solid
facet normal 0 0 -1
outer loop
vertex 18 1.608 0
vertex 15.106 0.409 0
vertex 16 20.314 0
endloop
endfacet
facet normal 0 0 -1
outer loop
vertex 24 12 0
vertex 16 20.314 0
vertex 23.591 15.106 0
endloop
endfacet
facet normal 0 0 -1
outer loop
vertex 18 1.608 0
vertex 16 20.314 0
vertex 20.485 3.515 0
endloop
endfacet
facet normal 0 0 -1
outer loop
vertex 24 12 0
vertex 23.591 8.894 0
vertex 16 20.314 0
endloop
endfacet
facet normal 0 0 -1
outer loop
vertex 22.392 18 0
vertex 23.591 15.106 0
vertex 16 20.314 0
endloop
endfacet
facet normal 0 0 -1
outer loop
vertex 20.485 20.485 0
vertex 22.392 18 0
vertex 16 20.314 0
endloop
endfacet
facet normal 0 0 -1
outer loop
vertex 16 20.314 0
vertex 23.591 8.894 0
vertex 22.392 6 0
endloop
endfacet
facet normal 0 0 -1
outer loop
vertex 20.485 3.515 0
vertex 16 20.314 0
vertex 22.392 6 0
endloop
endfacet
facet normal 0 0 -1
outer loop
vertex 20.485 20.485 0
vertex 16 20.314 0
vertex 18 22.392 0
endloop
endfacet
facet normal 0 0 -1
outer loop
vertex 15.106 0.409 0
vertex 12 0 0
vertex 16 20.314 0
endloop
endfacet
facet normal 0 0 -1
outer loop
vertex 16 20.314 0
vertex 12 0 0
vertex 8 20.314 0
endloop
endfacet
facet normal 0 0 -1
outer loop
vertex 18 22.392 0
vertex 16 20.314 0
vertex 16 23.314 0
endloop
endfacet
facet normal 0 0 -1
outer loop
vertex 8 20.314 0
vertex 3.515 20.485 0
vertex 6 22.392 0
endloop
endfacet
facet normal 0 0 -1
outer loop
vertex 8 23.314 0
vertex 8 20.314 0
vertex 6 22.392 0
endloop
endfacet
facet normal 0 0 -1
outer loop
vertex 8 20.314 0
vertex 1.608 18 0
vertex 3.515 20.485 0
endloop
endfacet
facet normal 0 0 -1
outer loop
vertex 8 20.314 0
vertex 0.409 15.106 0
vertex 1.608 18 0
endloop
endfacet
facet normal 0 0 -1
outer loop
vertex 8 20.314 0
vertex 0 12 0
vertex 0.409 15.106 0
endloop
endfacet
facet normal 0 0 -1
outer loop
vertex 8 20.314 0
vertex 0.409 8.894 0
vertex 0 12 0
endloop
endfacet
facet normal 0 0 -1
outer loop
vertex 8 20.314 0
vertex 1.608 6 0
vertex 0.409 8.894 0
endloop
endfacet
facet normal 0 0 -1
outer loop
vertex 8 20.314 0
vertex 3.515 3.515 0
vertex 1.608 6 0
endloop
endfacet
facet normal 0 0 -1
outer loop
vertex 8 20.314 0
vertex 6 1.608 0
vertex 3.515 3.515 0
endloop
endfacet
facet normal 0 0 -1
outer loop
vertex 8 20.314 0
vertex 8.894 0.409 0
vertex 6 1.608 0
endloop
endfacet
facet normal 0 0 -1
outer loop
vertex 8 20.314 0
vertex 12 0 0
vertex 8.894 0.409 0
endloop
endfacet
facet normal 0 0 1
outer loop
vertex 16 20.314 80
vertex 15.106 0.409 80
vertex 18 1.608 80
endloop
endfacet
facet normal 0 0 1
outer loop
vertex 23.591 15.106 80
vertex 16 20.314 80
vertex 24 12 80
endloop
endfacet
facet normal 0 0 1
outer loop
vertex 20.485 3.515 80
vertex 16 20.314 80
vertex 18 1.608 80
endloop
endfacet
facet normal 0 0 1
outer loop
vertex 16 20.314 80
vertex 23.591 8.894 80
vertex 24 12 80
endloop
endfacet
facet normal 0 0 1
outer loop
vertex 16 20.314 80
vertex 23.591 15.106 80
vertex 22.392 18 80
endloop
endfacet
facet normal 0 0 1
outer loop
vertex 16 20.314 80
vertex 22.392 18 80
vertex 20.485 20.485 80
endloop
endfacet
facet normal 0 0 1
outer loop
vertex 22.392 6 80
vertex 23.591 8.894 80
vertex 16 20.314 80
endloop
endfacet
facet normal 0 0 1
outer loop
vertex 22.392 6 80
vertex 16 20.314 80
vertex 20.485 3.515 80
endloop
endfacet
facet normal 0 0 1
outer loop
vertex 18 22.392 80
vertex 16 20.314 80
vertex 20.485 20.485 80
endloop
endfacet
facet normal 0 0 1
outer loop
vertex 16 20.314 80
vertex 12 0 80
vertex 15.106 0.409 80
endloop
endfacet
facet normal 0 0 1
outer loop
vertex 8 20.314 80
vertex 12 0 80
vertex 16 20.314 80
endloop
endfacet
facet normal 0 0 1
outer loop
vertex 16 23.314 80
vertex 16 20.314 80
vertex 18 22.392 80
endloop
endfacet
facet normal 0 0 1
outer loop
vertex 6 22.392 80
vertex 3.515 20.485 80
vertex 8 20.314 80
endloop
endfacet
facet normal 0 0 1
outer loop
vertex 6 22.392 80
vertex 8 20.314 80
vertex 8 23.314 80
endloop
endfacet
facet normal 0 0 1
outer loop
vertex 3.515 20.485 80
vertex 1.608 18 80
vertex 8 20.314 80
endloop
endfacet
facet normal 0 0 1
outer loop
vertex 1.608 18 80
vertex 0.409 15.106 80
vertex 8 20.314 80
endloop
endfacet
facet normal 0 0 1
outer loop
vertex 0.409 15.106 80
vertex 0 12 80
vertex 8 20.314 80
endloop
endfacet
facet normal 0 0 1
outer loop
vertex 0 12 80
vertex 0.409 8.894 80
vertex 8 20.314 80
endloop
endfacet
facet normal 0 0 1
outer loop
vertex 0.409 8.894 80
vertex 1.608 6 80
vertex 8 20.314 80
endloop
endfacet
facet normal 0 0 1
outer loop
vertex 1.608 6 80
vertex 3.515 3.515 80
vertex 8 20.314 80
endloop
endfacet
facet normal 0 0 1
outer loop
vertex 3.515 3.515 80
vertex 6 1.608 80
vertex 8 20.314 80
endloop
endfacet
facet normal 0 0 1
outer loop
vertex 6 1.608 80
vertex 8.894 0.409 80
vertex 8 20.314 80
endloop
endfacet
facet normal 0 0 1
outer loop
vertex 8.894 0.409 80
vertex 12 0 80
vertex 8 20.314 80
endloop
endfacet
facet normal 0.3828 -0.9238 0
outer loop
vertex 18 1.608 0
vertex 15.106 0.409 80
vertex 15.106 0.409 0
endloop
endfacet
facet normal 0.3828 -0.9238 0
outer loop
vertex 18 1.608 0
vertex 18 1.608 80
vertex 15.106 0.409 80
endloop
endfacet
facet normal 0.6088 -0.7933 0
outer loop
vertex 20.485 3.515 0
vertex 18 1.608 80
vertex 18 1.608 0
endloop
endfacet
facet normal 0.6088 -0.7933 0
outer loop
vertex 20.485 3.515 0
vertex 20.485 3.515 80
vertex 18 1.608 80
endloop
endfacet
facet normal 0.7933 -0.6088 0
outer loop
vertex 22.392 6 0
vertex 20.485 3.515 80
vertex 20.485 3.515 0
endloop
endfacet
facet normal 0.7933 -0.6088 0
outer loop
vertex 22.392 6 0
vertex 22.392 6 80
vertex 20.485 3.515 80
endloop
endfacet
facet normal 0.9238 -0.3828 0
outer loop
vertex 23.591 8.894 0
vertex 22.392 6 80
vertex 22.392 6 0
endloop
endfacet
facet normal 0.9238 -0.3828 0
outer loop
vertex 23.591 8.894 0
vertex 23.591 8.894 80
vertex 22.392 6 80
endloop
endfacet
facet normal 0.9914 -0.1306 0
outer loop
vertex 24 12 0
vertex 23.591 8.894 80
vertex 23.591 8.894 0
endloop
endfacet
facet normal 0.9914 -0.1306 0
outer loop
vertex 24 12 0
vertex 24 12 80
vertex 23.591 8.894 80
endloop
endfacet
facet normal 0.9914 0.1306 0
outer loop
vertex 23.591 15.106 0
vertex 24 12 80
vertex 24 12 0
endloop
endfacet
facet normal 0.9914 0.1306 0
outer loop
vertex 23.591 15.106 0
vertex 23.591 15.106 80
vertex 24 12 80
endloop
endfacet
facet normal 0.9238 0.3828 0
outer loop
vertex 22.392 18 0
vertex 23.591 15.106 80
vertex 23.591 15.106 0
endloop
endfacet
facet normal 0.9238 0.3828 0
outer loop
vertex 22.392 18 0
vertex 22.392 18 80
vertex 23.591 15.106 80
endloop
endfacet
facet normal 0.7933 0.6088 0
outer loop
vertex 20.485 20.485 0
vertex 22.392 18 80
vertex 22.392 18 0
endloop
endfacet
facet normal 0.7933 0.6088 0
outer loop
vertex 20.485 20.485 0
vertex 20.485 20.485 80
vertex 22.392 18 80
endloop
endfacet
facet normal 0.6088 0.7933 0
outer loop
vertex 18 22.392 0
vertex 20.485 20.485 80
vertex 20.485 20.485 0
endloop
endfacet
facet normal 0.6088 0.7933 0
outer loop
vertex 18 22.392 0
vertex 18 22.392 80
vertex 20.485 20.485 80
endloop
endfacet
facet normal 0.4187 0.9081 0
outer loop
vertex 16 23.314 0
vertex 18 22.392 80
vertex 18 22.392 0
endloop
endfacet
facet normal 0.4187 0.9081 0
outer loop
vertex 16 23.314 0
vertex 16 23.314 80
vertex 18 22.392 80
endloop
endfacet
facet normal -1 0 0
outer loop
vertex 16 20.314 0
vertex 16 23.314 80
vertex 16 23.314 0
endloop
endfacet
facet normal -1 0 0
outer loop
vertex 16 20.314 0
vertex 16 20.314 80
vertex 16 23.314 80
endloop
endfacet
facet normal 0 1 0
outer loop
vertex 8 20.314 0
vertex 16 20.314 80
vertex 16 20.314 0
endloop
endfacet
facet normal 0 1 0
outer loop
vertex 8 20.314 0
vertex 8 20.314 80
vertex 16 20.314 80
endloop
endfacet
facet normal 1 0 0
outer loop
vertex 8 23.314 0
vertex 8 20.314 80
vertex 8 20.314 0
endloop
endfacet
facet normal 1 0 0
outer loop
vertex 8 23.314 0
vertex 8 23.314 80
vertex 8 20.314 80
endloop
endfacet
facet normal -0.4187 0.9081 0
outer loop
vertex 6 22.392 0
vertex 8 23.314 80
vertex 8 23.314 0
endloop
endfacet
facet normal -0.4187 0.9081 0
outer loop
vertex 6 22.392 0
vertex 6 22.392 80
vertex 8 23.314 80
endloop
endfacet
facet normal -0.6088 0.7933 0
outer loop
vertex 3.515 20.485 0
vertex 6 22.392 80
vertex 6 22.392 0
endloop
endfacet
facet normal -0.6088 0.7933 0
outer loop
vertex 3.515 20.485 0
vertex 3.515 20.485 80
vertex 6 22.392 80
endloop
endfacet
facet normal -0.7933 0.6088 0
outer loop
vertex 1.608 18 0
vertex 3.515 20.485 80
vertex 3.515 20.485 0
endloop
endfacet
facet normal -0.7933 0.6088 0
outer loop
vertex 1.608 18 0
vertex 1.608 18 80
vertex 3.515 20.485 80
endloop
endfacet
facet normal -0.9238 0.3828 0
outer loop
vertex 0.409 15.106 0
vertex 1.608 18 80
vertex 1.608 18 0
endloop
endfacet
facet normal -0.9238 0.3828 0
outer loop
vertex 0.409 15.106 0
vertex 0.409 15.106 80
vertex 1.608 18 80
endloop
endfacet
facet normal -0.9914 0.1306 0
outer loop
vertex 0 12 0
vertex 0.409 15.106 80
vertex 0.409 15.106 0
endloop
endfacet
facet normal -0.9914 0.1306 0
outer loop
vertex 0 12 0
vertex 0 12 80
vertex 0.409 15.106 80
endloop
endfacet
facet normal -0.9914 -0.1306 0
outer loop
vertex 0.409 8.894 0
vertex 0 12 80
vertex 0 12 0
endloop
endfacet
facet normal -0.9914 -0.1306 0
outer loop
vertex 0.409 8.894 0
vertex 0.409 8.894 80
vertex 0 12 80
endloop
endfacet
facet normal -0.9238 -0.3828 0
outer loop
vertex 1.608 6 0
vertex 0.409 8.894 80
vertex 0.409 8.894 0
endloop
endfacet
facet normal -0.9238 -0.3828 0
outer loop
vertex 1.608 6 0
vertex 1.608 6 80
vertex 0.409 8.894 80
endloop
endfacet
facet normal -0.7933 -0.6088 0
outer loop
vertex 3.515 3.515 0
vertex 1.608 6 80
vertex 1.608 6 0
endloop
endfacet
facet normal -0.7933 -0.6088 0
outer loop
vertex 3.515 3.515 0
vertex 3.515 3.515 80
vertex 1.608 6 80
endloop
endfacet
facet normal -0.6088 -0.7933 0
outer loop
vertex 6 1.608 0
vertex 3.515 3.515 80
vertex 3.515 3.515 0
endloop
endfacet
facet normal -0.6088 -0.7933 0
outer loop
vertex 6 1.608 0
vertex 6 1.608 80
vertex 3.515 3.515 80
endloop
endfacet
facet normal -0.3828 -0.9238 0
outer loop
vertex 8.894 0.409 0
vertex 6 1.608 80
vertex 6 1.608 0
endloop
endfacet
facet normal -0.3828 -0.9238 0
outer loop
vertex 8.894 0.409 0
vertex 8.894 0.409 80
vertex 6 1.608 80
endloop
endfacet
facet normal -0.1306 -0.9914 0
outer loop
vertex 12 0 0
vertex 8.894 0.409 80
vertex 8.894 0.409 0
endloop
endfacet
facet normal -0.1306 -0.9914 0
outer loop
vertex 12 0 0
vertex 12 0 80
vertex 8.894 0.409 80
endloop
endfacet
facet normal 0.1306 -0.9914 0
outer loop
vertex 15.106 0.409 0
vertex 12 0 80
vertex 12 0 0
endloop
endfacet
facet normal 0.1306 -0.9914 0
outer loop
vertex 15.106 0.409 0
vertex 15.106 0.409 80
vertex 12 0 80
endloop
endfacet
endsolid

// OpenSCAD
$fn = 32;

// ----------------------------------------------------------------------
// Keyway shaft: d24 shaft, key 8 x 3 mm
// ----------------------------------------------------------------------

// --- parameters (mm) ---
shaft_r = 12;             // shaft radius
key_w = 8;                // keyway width
key_d = 3;                // keyway depth below the surface line
plate_t = 80;             // shaft length, Z (extrusion height)

shaft_d = 2 * shaft_r;  // shaft diameter
circle_step = 15;  // polygon sampling step, degrees

profile = [[6, 22.392], [3.515, 20.485], [1.608, 18], [0.409, 15.106], [0, 12], [0.409, 8.894], [1.608, 6], [3.515, 3.515], [6, 1.608], [8.894, 0.409], [12, 0], [15.106, 0.409], [18, 1.608], [20.485, 3.515], [22.392, 6], [23.591, 8.894], [24, 12], [23.591, 15.106], [22.392, 18], [20.485, 20.485], [18, 22.392], [16, 23.314], [16, 20.314], [8, 20.314], [8, 23.314]];  // primary outline, 25 points, counter clockwise

// --- the one profile operation ---
linear_extrude(height = plate_t) polygon(points = profile);
